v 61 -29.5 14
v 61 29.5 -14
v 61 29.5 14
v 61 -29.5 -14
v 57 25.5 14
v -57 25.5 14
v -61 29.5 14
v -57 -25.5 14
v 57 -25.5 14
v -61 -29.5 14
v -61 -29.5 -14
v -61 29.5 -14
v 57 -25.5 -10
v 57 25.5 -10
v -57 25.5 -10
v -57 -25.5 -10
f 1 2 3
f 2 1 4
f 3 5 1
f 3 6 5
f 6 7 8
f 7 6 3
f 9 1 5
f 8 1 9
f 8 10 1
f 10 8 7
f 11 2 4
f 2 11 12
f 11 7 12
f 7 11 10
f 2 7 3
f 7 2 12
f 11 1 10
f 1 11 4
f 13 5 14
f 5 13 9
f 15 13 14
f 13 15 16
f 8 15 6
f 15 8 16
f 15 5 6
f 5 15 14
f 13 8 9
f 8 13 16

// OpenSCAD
length=114;
width=51;
height=20;
thickness=4;
radius=3;
$fn=360;


difference(){
    cube([length+2*thickness,width+2*thickness,height+2*thickness],true);  
    translate([0,0,10]) cube([length,width,height+20],true);
}
